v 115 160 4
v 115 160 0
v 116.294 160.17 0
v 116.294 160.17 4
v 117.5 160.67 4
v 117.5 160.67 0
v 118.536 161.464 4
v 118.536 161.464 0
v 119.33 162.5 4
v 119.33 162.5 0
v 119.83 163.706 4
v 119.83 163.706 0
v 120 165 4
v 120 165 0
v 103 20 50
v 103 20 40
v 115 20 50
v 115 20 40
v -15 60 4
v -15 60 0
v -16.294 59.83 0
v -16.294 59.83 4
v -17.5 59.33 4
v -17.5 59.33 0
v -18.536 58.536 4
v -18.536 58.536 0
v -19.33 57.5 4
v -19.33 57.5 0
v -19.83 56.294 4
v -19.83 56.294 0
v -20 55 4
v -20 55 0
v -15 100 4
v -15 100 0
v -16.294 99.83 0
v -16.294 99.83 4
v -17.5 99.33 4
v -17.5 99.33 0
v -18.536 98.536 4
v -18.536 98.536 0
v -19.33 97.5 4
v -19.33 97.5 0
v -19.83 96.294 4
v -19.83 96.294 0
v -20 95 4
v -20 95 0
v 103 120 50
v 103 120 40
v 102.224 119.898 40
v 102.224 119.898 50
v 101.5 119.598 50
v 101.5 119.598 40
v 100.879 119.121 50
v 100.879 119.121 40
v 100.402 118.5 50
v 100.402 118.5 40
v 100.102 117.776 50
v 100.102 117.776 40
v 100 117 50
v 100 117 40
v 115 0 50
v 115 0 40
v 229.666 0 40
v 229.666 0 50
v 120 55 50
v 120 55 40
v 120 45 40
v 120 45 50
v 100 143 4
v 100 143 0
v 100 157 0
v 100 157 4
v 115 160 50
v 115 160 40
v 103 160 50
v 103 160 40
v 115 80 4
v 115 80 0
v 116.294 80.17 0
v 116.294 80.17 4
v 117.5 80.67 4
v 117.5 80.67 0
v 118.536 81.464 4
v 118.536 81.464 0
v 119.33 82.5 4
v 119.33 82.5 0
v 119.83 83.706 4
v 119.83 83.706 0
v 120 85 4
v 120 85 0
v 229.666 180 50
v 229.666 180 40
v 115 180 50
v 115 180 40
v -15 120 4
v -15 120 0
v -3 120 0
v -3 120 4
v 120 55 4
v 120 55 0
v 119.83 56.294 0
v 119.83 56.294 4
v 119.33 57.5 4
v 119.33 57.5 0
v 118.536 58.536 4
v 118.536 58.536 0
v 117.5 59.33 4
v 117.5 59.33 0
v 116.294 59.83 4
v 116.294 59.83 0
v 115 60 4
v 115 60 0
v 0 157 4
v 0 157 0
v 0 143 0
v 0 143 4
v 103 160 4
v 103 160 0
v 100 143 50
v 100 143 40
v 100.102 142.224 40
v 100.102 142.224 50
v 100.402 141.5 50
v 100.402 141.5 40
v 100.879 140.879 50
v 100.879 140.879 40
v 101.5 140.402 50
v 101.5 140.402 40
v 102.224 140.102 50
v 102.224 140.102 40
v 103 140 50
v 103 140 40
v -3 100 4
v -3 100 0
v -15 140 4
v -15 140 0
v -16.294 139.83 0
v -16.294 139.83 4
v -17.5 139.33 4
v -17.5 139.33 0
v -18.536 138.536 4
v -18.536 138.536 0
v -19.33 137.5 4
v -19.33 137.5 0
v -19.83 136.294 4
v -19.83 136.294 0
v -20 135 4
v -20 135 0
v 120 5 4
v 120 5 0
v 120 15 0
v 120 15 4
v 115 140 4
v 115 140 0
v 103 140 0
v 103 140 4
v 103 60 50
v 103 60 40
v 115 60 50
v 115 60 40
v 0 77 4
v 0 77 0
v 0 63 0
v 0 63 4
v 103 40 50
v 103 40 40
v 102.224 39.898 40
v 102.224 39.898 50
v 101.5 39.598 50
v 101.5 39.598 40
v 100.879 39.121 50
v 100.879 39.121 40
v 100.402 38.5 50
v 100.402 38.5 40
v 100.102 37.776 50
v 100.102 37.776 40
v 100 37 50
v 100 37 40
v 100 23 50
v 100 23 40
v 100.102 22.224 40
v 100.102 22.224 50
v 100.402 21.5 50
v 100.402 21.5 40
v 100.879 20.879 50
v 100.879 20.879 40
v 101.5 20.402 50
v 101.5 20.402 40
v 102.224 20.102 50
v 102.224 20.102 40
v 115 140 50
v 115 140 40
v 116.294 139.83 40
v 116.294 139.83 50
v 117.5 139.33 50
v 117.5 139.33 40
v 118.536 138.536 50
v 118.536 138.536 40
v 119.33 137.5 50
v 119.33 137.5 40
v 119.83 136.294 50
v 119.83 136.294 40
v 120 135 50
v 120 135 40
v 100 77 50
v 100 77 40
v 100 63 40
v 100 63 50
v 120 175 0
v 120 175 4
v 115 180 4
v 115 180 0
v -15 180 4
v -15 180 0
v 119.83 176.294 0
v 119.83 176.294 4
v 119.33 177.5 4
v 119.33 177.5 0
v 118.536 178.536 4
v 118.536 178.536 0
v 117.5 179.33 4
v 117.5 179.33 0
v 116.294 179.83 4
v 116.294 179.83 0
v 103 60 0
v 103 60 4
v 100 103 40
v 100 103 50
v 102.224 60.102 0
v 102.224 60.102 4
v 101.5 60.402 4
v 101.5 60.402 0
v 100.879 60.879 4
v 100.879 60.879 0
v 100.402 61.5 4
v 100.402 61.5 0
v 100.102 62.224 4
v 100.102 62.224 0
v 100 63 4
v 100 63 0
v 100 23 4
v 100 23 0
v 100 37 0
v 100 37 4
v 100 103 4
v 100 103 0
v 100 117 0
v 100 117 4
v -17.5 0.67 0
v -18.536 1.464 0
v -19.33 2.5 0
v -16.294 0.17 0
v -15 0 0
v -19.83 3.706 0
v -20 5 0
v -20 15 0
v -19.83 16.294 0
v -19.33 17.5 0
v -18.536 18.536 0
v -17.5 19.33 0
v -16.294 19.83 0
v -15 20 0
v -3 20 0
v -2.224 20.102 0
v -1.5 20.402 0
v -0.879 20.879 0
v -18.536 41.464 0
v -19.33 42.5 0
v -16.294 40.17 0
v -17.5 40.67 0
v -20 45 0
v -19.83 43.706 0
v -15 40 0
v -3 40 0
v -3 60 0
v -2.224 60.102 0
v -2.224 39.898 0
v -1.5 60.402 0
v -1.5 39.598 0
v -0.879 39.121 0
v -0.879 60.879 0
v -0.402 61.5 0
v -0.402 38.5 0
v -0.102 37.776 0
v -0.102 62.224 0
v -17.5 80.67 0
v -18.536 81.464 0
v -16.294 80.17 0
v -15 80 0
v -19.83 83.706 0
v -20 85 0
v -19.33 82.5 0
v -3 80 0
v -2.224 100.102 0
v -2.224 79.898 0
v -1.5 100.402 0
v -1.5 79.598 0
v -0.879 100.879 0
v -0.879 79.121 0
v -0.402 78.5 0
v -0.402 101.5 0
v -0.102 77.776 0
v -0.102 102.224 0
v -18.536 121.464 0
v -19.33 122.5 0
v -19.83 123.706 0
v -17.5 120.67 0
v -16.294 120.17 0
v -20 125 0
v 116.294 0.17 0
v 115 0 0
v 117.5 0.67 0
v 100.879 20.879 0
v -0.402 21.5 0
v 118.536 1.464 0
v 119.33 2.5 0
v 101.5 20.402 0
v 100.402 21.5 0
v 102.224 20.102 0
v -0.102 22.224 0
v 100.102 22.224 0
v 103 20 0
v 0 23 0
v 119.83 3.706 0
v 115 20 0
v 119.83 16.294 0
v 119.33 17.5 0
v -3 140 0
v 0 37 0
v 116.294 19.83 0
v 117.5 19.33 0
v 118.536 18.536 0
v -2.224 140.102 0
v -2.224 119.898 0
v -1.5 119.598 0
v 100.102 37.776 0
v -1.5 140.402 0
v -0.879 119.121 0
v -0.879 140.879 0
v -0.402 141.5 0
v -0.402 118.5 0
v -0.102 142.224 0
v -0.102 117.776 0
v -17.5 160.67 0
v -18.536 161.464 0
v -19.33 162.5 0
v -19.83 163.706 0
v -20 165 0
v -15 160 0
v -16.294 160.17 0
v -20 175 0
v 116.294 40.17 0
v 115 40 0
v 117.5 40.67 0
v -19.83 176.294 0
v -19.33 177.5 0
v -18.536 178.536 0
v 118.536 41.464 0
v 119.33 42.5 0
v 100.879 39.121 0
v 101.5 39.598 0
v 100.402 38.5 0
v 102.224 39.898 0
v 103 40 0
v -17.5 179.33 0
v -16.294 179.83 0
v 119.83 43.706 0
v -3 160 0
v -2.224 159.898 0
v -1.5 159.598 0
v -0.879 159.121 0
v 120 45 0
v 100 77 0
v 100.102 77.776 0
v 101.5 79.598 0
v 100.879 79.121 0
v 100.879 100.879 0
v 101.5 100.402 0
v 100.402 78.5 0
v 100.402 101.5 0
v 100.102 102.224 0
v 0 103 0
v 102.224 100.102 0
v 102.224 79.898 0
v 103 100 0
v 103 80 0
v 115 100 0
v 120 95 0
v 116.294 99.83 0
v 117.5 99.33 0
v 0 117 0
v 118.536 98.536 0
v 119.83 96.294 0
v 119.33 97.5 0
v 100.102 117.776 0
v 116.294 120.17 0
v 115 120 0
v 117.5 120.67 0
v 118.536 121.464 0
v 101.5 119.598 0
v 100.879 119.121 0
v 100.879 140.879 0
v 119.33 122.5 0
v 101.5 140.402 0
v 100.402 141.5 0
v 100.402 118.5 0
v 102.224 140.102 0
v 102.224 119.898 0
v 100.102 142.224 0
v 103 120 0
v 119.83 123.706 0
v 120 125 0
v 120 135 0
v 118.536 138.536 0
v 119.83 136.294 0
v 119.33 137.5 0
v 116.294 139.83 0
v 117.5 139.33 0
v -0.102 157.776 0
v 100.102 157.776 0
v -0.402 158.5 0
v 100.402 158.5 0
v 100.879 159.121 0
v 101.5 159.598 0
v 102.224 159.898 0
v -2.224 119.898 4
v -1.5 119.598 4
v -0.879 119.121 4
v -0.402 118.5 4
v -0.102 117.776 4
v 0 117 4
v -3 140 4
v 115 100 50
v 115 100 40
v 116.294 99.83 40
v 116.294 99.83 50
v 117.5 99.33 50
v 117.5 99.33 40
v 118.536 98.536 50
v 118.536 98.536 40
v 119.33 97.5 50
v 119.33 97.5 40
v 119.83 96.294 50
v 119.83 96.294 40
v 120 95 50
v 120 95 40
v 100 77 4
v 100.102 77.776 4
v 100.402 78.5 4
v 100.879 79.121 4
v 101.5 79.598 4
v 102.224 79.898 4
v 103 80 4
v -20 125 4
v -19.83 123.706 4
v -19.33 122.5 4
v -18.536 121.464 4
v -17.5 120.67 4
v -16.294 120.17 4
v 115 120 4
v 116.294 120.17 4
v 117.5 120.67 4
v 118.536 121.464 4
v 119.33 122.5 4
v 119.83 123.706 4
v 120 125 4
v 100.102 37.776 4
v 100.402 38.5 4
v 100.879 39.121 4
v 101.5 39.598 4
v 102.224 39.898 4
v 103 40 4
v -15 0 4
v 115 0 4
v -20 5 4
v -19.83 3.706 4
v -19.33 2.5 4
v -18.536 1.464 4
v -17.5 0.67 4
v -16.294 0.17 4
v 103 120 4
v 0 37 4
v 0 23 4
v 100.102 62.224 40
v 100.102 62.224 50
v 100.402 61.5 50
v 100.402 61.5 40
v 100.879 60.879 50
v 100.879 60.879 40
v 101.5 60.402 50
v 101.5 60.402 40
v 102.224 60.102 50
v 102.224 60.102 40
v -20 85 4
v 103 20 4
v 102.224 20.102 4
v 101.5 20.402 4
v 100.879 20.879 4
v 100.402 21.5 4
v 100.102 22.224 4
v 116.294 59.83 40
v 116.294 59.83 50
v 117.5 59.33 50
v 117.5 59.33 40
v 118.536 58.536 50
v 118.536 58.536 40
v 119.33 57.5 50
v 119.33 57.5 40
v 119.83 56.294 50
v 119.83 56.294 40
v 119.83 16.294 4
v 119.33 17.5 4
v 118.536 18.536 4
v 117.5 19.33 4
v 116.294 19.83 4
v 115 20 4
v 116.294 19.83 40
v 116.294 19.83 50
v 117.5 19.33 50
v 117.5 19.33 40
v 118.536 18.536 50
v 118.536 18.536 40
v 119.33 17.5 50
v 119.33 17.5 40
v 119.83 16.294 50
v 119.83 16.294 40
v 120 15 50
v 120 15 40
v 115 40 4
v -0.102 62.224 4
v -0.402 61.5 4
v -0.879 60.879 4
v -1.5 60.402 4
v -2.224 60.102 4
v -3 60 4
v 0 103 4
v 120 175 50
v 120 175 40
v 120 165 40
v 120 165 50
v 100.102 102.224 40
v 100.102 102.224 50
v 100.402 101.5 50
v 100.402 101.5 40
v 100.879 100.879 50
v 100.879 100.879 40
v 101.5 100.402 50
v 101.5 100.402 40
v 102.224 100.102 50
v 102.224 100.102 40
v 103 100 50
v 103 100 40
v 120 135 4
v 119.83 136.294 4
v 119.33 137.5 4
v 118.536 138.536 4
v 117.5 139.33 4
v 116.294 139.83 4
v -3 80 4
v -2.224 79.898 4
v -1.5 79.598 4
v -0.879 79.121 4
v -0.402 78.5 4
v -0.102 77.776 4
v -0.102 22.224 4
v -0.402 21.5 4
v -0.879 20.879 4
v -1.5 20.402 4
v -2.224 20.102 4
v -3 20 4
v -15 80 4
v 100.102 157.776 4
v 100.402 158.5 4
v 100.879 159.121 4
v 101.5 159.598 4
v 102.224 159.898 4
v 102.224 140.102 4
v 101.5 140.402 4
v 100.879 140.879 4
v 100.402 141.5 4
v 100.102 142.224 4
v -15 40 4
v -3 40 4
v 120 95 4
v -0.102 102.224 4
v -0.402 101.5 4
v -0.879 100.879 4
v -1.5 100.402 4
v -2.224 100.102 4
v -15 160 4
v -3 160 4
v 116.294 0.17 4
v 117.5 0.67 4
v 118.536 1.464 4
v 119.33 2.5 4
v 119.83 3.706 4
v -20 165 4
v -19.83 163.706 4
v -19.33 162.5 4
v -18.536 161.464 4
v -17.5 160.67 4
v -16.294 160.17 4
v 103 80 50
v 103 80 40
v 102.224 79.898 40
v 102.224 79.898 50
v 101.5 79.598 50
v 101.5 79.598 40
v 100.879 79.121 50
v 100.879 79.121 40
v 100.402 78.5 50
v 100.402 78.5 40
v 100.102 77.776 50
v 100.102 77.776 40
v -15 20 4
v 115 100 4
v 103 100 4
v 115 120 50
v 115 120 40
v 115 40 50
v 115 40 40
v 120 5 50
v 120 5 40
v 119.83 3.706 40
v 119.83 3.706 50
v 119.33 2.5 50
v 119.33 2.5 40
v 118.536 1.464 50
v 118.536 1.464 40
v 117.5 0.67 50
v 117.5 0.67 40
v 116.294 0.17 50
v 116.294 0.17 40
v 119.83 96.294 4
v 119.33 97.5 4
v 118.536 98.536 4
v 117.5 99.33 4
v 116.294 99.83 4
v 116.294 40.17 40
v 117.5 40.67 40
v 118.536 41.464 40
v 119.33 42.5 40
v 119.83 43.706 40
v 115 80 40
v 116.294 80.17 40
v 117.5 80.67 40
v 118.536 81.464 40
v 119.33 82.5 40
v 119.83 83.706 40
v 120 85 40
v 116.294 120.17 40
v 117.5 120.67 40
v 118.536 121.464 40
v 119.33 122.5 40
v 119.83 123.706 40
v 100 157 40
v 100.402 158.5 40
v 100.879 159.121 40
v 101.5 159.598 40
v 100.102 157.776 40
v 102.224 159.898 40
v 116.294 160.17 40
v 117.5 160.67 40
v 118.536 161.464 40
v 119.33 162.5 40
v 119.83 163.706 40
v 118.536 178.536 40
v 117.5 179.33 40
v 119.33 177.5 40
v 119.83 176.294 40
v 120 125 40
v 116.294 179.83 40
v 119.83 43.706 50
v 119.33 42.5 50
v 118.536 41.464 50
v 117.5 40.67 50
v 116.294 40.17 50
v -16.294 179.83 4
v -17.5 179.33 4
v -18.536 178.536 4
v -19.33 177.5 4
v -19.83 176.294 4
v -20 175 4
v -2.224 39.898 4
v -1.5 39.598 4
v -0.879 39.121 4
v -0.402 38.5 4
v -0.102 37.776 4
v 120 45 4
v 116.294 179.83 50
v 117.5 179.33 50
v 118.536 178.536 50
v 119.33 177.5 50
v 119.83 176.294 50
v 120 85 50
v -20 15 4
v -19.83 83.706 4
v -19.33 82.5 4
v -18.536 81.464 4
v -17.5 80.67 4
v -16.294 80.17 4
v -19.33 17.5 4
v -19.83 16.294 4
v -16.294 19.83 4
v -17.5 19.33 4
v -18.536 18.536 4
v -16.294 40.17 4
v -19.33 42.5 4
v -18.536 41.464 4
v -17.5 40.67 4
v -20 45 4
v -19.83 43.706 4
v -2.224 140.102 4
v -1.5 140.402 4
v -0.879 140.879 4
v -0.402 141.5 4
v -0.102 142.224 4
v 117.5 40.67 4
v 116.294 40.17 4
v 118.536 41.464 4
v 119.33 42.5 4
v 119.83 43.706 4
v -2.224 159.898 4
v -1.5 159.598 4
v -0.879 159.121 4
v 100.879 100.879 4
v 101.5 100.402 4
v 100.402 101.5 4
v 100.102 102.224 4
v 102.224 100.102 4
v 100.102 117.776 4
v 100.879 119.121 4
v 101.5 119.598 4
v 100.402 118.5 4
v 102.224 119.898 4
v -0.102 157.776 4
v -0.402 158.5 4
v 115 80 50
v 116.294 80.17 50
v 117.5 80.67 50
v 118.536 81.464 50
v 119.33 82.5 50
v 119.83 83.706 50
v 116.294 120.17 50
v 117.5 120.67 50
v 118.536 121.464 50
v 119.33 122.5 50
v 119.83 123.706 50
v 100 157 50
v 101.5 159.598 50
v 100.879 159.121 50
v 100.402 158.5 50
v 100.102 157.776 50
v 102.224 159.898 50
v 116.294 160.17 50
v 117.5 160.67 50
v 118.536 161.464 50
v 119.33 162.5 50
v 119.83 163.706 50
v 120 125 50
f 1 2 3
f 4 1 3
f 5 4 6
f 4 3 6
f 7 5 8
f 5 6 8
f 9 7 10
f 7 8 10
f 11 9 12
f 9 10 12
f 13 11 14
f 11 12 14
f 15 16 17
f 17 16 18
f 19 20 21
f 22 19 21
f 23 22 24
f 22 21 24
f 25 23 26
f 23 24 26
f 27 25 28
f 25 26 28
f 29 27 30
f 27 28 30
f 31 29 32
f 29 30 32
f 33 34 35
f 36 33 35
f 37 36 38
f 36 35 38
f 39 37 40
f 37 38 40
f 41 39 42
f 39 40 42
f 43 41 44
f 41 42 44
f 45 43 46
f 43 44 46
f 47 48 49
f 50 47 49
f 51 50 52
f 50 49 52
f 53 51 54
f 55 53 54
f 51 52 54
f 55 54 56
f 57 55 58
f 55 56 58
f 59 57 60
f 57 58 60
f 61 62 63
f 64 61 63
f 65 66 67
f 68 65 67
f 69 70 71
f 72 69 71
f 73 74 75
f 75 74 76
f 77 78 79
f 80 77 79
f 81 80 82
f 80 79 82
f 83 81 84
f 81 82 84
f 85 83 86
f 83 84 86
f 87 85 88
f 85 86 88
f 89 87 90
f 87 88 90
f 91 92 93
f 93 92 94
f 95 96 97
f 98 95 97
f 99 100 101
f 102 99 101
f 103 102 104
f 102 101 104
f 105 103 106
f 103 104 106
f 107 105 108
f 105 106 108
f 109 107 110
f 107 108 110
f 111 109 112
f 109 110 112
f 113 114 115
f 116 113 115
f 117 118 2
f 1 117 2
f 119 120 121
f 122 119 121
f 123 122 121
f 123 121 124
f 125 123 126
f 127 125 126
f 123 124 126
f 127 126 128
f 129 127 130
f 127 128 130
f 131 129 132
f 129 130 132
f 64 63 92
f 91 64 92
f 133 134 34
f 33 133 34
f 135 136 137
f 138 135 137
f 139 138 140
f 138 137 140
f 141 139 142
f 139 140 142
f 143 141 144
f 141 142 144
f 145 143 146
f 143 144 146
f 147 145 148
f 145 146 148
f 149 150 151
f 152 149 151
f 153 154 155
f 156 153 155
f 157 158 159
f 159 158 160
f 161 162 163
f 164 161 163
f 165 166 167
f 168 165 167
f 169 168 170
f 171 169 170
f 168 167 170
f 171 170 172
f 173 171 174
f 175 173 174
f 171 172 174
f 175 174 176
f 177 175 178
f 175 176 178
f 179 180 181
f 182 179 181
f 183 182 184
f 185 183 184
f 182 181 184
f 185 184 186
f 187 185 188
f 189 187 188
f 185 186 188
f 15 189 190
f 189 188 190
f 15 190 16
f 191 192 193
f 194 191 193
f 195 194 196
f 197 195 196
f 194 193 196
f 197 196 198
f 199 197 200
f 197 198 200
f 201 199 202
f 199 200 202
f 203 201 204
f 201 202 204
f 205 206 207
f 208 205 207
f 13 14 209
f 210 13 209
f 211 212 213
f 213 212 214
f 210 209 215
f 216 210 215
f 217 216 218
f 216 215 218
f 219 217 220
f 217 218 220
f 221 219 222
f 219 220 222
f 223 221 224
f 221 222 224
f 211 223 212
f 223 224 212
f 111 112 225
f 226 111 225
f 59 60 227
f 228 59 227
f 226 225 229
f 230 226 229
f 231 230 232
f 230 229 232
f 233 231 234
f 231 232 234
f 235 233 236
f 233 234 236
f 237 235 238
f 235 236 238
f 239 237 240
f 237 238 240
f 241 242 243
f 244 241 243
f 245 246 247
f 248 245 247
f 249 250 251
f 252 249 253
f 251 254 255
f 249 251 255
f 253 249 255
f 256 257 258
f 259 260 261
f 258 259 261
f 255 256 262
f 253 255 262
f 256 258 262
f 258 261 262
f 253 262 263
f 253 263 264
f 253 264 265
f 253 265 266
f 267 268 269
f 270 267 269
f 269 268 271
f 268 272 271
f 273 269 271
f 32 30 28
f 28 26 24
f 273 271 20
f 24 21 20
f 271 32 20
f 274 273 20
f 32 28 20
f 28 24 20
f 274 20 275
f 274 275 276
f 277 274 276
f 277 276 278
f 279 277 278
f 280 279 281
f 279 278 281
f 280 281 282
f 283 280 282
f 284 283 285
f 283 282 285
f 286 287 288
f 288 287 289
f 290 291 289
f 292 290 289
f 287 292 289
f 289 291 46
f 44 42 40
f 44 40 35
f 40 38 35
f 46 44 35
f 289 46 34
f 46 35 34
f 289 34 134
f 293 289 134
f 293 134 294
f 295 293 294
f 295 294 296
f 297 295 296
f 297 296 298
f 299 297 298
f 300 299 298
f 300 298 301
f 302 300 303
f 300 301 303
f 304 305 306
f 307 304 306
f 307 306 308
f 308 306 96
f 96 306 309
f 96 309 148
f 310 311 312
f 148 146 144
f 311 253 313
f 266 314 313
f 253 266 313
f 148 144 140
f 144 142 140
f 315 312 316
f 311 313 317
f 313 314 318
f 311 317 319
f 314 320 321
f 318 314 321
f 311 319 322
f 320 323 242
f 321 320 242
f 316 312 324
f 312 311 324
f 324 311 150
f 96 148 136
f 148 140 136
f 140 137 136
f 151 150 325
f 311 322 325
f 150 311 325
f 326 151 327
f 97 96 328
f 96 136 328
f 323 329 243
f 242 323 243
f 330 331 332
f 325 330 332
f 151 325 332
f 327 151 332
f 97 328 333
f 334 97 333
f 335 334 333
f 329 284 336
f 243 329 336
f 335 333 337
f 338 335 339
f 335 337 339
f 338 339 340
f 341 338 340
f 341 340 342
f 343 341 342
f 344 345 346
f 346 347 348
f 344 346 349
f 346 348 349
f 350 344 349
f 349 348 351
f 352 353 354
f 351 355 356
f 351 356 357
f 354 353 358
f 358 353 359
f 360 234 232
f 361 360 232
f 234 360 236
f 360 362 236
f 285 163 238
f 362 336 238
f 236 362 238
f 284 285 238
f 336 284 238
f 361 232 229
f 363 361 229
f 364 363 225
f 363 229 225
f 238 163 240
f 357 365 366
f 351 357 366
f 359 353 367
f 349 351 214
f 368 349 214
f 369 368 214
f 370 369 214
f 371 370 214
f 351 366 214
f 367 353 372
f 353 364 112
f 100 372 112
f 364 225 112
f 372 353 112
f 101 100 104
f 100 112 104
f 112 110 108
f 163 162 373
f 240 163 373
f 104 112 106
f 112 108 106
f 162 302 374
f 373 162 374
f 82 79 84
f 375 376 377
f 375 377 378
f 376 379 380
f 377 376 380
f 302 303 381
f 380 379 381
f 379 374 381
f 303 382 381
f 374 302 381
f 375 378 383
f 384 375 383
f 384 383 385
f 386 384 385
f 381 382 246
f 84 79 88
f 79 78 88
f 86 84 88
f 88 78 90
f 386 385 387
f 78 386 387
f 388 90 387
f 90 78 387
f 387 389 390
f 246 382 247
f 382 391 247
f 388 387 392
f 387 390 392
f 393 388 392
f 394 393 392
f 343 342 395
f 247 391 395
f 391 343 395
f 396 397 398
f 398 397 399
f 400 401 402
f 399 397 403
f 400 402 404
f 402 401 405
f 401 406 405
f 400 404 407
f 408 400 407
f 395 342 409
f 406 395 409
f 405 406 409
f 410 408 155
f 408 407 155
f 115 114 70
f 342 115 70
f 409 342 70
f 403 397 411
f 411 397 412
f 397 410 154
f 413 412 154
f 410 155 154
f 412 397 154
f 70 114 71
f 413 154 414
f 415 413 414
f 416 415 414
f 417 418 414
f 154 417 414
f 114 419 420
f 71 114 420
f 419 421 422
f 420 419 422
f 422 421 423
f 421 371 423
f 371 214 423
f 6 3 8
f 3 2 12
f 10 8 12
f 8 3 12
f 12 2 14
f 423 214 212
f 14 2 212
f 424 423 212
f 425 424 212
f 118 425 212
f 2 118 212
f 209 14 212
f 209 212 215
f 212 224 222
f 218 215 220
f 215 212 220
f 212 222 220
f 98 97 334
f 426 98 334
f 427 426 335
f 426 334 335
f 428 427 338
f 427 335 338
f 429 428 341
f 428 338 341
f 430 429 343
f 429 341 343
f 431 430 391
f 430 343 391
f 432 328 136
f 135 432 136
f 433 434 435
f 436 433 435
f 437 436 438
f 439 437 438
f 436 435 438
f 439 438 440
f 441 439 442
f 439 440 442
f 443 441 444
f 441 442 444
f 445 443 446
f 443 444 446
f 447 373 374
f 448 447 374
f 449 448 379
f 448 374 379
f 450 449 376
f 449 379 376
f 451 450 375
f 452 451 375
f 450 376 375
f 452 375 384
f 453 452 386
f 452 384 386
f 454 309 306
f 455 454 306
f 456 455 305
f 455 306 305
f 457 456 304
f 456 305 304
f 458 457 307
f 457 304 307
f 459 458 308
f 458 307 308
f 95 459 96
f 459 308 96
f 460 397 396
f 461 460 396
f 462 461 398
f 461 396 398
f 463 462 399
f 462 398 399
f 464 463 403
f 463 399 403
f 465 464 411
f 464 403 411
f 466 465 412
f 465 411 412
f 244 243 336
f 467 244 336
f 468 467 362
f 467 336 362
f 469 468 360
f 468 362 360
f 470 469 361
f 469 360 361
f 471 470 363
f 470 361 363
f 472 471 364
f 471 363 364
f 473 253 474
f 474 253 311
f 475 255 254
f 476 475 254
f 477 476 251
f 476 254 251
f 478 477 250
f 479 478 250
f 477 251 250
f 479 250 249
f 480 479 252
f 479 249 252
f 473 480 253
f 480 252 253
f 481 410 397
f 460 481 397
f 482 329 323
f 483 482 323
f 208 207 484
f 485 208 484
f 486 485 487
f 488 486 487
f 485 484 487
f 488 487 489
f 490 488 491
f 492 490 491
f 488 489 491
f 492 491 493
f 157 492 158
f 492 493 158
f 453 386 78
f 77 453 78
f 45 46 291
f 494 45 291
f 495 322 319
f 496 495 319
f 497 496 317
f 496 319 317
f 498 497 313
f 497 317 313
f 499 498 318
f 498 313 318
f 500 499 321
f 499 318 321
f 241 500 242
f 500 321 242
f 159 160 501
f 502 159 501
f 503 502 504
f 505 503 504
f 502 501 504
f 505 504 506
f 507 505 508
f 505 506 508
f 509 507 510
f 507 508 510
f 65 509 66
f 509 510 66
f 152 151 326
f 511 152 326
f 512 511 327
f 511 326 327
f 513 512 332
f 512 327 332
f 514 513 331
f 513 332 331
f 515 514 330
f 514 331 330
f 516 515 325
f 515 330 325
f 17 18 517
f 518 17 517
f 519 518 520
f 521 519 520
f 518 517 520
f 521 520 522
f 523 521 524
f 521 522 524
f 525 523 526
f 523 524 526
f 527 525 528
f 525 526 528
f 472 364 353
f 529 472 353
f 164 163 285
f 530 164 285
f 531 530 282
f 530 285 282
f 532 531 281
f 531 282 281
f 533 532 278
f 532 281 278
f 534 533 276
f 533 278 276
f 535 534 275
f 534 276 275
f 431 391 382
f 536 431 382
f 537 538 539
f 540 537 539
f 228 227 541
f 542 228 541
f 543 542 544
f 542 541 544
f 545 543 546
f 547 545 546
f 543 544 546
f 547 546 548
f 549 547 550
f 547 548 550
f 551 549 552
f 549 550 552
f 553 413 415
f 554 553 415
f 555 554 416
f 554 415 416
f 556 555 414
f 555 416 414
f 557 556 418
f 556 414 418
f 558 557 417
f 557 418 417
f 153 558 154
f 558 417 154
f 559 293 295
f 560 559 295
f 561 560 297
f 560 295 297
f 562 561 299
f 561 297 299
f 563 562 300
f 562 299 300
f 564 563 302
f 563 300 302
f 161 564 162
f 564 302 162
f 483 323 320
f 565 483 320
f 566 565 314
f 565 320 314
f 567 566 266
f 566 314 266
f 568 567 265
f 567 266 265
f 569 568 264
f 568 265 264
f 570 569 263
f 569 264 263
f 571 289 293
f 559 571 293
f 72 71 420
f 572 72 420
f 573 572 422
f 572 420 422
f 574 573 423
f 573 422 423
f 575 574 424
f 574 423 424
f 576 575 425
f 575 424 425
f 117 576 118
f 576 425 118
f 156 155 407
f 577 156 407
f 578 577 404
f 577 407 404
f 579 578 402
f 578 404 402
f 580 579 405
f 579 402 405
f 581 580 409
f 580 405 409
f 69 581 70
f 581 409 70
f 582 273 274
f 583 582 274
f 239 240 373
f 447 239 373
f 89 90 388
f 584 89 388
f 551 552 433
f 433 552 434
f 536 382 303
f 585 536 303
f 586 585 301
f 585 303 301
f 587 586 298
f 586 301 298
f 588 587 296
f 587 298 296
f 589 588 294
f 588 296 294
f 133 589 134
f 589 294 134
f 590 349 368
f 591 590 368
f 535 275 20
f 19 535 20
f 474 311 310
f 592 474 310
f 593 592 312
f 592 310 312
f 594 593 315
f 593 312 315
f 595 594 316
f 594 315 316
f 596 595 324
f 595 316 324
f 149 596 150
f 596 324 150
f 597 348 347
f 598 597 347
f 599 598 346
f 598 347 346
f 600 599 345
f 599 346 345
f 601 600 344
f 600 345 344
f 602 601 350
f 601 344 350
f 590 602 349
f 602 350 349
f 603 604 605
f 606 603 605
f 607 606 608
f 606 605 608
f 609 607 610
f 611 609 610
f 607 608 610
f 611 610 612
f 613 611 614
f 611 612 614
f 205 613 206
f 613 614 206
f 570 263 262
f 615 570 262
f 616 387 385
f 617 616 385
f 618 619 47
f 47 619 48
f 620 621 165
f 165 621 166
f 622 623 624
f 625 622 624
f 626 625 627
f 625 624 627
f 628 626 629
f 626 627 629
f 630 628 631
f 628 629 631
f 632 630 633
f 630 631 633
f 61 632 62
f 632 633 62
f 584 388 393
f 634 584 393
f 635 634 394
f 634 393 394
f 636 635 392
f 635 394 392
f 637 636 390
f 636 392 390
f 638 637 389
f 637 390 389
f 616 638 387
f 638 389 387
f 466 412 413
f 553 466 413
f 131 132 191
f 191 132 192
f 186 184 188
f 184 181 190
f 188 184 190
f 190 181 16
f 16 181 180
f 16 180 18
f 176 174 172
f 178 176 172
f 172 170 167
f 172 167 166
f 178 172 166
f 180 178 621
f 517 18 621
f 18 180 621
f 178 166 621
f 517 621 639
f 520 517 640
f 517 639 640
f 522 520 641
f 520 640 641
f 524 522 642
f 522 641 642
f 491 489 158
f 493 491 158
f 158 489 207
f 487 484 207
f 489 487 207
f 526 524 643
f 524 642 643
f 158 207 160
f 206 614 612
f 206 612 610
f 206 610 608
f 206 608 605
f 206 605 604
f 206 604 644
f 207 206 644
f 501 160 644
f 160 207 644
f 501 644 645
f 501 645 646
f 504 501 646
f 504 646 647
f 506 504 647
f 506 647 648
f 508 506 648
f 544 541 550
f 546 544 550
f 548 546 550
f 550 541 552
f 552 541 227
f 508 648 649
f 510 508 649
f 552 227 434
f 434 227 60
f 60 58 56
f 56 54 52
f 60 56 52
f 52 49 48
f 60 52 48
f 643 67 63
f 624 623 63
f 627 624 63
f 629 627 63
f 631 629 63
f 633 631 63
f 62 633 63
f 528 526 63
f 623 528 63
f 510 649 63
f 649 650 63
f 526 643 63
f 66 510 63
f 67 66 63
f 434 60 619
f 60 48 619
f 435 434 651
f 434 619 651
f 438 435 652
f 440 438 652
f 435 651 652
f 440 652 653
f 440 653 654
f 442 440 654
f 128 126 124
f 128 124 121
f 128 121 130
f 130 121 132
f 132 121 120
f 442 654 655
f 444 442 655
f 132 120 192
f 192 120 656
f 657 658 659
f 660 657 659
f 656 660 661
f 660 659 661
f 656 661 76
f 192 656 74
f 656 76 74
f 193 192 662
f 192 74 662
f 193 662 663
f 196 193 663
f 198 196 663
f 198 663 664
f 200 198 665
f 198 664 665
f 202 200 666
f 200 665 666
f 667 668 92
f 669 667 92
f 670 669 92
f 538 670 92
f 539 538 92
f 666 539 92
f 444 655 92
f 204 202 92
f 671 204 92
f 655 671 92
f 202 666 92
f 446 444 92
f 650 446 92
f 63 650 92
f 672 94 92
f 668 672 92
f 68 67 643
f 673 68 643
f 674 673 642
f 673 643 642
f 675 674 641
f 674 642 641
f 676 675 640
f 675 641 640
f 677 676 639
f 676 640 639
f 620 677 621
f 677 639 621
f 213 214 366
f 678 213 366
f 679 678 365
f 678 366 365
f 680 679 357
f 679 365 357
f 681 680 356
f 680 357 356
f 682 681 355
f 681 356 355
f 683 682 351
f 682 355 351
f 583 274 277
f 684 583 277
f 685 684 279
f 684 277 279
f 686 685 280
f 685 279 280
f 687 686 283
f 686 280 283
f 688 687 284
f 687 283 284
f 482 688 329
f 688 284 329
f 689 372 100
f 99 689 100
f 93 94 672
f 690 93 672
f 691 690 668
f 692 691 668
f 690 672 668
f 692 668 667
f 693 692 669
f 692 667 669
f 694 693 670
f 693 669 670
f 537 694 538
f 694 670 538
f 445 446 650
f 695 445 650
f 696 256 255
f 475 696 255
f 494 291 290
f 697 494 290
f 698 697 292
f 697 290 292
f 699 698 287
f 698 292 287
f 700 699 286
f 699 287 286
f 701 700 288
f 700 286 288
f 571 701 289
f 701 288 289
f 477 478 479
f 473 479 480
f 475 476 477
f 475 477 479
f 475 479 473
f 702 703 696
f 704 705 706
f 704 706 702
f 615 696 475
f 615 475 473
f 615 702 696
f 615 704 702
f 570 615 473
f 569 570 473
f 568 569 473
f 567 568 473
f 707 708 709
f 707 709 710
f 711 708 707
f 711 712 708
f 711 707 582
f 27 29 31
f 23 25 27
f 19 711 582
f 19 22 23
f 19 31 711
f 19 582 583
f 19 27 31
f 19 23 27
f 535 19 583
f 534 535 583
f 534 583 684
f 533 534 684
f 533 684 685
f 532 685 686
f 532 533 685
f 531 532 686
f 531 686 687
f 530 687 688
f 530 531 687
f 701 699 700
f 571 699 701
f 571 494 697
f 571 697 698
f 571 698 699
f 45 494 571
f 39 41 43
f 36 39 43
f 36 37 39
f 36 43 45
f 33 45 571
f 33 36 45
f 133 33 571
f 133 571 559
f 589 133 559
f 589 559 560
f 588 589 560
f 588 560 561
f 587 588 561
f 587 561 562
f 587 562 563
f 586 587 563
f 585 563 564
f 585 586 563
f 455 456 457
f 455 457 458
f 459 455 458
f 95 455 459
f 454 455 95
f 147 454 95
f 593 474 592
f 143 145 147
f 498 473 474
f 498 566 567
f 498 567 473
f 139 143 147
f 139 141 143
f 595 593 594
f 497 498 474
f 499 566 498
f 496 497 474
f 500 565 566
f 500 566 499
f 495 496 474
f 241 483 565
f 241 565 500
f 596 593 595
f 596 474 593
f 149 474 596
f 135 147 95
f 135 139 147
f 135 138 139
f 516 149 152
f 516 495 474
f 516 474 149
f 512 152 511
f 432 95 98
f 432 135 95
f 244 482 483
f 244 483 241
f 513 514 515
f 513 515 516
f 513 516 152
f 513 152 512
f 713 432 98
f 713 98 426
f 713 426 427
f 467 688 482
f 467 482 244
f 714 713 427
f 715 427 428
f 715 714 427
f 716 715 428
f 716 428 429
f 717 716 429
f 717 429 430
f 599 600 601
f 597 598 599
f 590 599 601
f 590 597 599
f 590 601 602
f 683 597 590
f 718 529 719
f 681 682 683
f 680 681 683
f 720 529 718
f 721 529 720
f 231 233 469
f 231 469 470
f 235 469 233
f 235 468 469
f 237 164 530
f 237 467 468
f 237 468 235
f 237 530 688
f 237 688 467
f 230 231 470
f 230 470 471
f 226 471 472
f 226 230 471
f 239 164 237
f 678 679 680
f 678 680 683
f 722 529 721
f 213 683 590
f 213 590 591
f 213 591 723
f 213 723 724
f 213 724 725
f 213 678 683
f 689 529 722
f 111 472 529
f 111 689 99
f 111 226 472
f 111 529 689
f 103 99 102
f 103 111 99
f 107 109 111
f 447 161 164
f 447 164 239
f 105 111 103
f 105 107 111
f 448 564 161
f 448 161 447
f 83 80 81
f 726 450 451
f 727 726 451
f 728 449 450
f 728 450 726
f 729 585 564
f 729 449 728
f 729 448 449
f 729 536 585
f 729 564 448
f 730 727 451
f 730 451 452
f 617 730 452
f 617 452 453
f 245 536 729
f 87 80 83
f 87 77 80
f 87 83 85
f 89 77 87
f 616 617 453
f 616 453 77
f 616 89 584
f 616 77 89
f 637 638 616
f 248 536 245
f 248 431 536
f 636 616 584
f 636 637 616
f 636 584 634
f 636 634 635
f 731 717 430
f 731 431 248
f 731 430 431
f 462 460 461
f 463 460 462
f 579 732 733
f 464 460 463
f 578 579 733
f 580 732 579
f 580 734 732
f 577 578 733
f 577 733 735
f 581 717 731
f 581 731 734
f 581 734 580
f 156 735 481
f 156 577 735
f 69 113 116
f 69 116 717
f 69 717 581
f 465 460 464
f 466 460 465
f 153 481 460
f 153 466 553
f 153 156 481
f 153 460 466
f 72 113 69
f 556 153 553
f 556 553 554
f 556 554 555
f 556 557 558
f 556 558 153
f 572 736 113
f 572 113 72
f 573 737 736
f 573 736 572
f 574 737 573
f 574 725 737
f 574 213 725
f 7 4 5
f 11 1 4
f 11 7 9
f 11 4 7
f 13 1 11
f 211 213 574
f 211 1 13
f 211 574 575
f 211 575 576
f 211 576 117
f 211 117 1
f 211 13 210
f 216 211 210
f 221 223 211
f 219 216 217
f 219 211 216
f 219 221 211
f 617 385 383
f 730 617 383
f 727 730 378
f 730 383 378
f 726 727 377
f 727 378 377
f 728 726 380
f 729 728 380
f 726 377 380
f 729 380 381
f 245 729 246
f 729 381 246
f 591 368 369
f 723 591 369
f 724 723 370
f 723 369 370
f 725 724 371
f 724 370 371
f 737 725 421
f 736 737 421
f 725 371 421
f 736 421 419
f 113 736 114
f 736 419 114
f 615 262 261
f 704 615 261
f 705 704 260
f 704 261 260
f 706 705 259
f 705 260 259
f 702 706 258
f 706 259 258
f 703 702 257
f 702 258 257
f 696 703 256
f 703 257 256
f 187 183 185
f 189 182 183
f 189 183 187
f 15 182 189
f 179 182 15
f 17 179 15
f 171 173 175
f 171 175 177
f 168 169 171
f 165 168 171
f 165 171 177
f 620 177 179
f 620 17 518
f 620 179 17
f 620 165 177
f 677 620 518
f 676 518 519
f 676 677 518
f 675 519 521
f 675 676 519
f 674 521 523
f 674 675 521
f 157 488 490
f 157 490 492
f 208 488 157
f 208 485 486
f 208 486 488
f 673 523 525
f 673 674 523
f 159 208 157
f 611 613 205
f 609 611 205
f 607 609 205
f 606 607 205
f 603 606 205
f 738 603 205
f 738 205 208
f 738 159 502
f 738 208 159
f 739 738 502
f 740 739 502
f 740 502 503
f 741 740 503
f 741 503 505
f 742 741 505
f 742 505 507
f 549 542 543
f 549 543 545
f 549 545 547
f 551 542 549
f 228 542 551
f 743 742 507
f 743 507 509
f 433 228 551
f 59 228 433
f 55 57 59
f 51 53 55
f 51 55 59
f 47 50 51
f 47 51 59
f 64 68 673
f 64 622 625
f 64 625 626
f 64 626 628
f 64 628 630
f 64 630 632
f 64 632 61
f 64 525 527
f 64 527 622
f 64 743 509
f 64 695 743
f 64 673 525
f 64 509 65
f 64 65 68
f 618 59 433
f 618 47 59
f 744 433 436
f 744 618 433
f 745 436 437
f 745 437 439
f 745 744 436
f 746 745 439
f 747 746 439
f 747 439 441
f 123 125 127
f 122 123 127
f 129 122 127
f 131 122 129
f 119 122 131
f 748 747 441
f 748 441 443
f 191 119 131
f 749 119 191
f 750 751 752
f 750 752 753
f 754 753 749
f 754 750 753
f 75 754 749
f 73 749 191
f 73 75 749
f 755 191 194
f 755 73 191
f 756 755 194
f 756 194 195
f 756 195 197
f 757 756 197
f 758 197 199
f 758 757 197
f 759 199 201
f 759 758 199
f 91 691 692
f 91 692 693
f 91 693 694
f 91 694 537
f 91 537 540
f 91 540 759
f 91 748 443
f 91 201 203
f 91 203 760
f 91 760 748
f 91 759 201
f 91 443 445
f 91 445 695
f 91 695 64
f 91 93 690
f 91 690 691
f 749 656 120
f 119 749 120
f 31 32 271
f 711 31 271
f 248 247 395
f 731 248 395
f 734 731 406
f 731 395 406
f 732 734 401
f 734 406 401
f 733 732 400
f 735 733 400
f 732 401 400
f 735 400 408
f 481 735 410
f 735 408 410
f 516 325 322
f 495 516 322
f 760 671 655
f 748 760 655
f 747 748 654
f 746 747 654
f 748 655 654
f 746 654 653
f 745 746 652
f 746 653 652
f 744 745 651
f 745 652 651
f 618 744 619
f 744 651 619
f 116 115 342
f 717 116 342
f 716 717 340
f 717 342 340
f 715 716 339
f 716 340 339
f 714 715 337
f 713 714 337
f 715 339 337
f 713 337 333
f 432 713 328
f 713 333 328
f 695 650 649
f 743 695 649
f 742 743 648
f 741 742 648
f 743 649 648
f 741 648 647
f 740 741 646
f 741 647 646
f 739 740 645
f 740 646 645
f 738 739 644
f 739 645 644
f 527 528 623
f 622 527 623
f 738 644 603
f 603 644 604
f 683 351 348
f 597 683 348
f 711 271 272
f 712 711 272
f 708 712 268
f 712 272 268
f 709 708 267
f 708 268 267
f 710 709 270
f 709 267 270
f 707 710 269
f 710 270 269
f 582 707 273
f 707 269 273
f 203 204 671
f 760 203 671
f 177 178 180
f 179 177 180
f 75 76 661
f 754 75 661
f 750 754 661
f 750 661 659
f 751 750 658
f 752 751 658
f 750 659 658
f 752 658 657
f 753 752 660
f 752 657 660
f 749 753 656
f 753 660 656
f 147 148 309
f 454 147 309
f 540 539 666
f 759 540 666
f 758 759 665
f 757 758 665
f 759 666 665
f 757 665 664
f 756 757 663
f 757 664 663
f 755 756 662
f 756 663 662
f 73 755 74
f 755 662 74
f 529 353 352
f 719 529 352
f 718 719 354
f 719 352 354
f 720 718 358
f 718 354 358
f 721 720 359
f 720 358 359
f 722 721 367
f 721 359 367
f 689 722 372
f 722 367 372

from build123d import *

# Parameters (mm, degrees)
F1_DEPTH = 4
F2_START = 40
F2_DEPTH = 10


with BuildPart() as f1:
    # F0 (on Top) → F1 (new body)
    with BuildSketch(Plane.XY):
        with BuildLine():
            Line((-15, 0), (0, 0))
            Line((0, 0), (100, 0))
            Line((100, 0), (115, 0))
            ThreePointArc((115, 0), (118.5355339059, 1.4644660941), (120, 5))
            Line((120, 5), (120, 15))
            ThreePointArc((120, 15), (118.5355339059, 18.5355339059), (115, 20))
            Line((115, 20), (103, 20))
            ThreePointArc((103, 20), (100.8786796564, 20.8786796564), (100, 23))
            Line((100, 23), (100, 37))
            ThreePointArc((100, 37), (100.8786796564, 39.1213203436), (103, 40))
            Line((103, 40), (115, 40))
            ThreePointArc((115, 40), (118.5355339059, 41.4644660941), (120, 45))
            Line((120, 45), (120, 55))
            ThreePointArc((120, 55), (118.5355339059, 58.5355339059), (115, 60))
            Line((115, 60), (103, 60))
            ThreePointArc((103, 60), (100.8786796564, 60.8786796564), (100, 63))
            Line((100, 63), (100, 77))
            ThreePointArc((100, 77), (100.8786796564, 79.1213203436), (103, 80))
            Line((103, 80), (115, 80))
            ThreePointArc((115, 80), (118.5355339059, 81.4644660941), (120, 85))
            Line((120, 85), (120, 95))
            ThreePointArc((120, 95), (118.5355339059, 98.5355339059), (115, 100))
            Line((115, 100), (103, 100))
            ThreePointArc((103, 100), (100.8786796564, 100.8786796564), (100, 103))
            Line((100, 103), (100, 117))
            ThreePointArc((100, 117), (100.8786796564, 119.1213203436), (103, 120))
            Line((103, 120), (115, 120))
            ThreePointArc((115, 120), (118.5355339059, 121.4644660941), (120, 125))
            Line((120, 125), (120, 135))
            ThreePointArc((120, 135), (118.5355339059, 138.5355339059), (115, 140))
            Line((115, 140), (103, 140))
            ThreePointArc((103, 140), (100.8786796564, 140.8786796564), (100, 143))
            Line((100, 143), (100, 157))
            ThreePointArc((100, 157), (100.8786796564, 159.1213203436), (103, 160))
            Line((103, 160), (115, 160))
            ThreePointArc((115, 160), (118.5355339059, 161.4644660941), (120, 165))
            Line((120, 165), (120, 175))
            ThreePointArc((120, 175), (118.5355339059, 178.5355339059), (115, 180))
            Line((115, 180), (100, 180))
            Line((100, 180), (0, 180))
            Line((0, 180), (-15, 180))
            ThreePointArc((-15, 180), (-18.5355339059, 178.5355339059), (-20, 175))
            Line((-20, 175), (-20, 165))
            ThreePointArc((-20, 165), (-18.5355339059, 161.4644660941), (-15, 160))
            Line((-15, 160), (-3, 160))
            ThreePointArc((-3, 160), (-0.8786796564, 159.1213203436), (0, 157))
            Line((0, 157), (0, 143))
            ThreePointArc((0, 143), (-0.8786796564, 140.8786796564), (-3, 140))
            Line((-3, 140), (-15, 140))
            ThreePointArc((-15, 140), (-18.5355339059, 138.5355339059), (-20, 135))
            Line((-20, 135), (-20, 125))
            ThreePointArc((-20, 125), (-18.5355339059, 121.4644660941), (-15, 120))
            Line((-15, 120), (-3, 120))
            ThreePointArc((-3, 120), (-0.8786796564, 119.1213203436), (0, 117))
            Line((0, 117), (0, 103))
            ThreePointArc((0, 103), (-0.8786796564, 100.8786796564), (-3, 100))
            Line((-3, 100), (-15, 100))
            ThreePointArc((-15, 100), (-18.5355339059, 98.5355339059), (-20, 95))
            Line((-20, 95), (-20, 85))
            ThreePointArc((-20, 85), (-18.5355339059, 81.4644660941), (-15, 80))
            Line((-15, 80), (-3, 80))
            ThreePointArc((-3, 80), (-0.8786796564, 79.1213203436), (0, 77))
            Line((0, 77), (0, 63))
            ThreePointArc((0, 63), (-0.8786796564, 60.8786796564), (-3, 60))
            Line((-3, 60), (-15, 60))
            ThreePointArc((-15, 60), (-18.5355339059, 58.5355339059), (-20, 55))
            Line((-20, 55), (-20, 45))
            ThreePointArc((-20, 45), (-18.5355339059, 41.4644660941), (-15, 40))
            Line((-15, 40), (-3, 40))
            ThreePointArc((-3, 40), (-0.8786796564, 39.1213203436), (0, 37))
            Line((0, 37), (0, 23))
            ThreePointArc((0, 23), (-0.8786796564, 20.8786796564), (-3, 20))
            Line((-3, 20), (-15, 20))
            ThreePointArc((-15, 20), (-18.5355339059, 18.5355339059), (-20, 15))
            Line((-20, 15), (-20, 5))
            ThreePointArc((-20, 5), (-18.5355339059, 1.4644660941), (-15, 0))
        make_face()
    extrude(amount=F1_DEPTH)


with BuildPart() as f2:
    # F0 (on Top) → F2 (new body)
    with BuildSketch(Plane.XY.offset(F2_START)):
        with BuildLine():
            ThreePointArc((120, 5), (118.5355339059, 1.4644660941), (115, 0))
            Line((115, 0), (229.6664118767, 0))
            Line((229.6664118767, 0), (229.6664118767, 180))
            Line((229.6664118767, 180), (115, 180))
            ThreePointArc((115, 180), (118.5355339059, 178.5355339059), (120, 175))
            Line((120, 175), (120, 165))
            ThreePointArc((120, 165), (118.5355339059, 161.4644660941), (115, 160))
            Line((115, 160), (103, 160))
            ThreePointArc((103, 160), (100.8786796564, 159.1213203436), (100, 157))
            Line((100, 157), (100, 143))
            ThreePointArc((100, 143), (100.8786796564, 140.8786796564), (103, 140))
            Line((103, 140), (115, 140))
            ThreePointArc((115, 140), (118.5355339059, 138.5355339059), (120, 135))
            Line((120, 135), (120, 125))
            ThreePointArc((120, 125), (118.5355339059, 121.4644660941), (115, 120))
            Line((115, 120), (103, 120))
            ThreePointArc((103, 120), (100.8786796564, 119.1213203436), (100, 117))
            Line((100, 117), (100, 103))
            ThreePointArc((100, 103), (100.8786796564, 100.8786796564), (103, 100))
            Line((103, 100), (115, 100))
            ThreePointArc((115, 100), (118.5355339059, 98.5355339059), (120, 95))
            Line((120, 95), (120, 85))
            ThreePointArc((120, 85), (118.5355339059, 81.4644660941), (115, 80))
            Line((115, 80), (103, 80))
            ThreePointArc((103, 80), (100.8786796564, 79.1213203436), (100, 77))
            Line((100, 77), (100, 63))
            ThreePointArc((100, 63), (100.8786796564, 60.8786796564), (103, 60))
            Line((103, 60), (115, 60))
            ThreePointArc((115, 60), (118.5355339059, 58.5355339059), (120, 55))
            Line((120, 55), (120, 45))
            ThreePointArc((120, 45), (118.5355339059, 41.4644660941), (115, 40))
            Line((115, 40), (103, 40))
            ThreePointArc((103, 40), (100.8786796564, 39.1213203436), (100, 37))
            Line((100, 37), (100, 23))
            ThreePointArc((100, 23), (100.8786796564, 20.8786796564), (103, 20))
            Line((103, 20), (115, 20))
            ThreePointArc((115, 20), (118.5355339059, 18.5355339059), (120, 15))
            Line((120, 15), (120, 5))
        make_face()
    extrude(amount=F2_DEPTH)


solid = Compound([f1.part, f2.part])
